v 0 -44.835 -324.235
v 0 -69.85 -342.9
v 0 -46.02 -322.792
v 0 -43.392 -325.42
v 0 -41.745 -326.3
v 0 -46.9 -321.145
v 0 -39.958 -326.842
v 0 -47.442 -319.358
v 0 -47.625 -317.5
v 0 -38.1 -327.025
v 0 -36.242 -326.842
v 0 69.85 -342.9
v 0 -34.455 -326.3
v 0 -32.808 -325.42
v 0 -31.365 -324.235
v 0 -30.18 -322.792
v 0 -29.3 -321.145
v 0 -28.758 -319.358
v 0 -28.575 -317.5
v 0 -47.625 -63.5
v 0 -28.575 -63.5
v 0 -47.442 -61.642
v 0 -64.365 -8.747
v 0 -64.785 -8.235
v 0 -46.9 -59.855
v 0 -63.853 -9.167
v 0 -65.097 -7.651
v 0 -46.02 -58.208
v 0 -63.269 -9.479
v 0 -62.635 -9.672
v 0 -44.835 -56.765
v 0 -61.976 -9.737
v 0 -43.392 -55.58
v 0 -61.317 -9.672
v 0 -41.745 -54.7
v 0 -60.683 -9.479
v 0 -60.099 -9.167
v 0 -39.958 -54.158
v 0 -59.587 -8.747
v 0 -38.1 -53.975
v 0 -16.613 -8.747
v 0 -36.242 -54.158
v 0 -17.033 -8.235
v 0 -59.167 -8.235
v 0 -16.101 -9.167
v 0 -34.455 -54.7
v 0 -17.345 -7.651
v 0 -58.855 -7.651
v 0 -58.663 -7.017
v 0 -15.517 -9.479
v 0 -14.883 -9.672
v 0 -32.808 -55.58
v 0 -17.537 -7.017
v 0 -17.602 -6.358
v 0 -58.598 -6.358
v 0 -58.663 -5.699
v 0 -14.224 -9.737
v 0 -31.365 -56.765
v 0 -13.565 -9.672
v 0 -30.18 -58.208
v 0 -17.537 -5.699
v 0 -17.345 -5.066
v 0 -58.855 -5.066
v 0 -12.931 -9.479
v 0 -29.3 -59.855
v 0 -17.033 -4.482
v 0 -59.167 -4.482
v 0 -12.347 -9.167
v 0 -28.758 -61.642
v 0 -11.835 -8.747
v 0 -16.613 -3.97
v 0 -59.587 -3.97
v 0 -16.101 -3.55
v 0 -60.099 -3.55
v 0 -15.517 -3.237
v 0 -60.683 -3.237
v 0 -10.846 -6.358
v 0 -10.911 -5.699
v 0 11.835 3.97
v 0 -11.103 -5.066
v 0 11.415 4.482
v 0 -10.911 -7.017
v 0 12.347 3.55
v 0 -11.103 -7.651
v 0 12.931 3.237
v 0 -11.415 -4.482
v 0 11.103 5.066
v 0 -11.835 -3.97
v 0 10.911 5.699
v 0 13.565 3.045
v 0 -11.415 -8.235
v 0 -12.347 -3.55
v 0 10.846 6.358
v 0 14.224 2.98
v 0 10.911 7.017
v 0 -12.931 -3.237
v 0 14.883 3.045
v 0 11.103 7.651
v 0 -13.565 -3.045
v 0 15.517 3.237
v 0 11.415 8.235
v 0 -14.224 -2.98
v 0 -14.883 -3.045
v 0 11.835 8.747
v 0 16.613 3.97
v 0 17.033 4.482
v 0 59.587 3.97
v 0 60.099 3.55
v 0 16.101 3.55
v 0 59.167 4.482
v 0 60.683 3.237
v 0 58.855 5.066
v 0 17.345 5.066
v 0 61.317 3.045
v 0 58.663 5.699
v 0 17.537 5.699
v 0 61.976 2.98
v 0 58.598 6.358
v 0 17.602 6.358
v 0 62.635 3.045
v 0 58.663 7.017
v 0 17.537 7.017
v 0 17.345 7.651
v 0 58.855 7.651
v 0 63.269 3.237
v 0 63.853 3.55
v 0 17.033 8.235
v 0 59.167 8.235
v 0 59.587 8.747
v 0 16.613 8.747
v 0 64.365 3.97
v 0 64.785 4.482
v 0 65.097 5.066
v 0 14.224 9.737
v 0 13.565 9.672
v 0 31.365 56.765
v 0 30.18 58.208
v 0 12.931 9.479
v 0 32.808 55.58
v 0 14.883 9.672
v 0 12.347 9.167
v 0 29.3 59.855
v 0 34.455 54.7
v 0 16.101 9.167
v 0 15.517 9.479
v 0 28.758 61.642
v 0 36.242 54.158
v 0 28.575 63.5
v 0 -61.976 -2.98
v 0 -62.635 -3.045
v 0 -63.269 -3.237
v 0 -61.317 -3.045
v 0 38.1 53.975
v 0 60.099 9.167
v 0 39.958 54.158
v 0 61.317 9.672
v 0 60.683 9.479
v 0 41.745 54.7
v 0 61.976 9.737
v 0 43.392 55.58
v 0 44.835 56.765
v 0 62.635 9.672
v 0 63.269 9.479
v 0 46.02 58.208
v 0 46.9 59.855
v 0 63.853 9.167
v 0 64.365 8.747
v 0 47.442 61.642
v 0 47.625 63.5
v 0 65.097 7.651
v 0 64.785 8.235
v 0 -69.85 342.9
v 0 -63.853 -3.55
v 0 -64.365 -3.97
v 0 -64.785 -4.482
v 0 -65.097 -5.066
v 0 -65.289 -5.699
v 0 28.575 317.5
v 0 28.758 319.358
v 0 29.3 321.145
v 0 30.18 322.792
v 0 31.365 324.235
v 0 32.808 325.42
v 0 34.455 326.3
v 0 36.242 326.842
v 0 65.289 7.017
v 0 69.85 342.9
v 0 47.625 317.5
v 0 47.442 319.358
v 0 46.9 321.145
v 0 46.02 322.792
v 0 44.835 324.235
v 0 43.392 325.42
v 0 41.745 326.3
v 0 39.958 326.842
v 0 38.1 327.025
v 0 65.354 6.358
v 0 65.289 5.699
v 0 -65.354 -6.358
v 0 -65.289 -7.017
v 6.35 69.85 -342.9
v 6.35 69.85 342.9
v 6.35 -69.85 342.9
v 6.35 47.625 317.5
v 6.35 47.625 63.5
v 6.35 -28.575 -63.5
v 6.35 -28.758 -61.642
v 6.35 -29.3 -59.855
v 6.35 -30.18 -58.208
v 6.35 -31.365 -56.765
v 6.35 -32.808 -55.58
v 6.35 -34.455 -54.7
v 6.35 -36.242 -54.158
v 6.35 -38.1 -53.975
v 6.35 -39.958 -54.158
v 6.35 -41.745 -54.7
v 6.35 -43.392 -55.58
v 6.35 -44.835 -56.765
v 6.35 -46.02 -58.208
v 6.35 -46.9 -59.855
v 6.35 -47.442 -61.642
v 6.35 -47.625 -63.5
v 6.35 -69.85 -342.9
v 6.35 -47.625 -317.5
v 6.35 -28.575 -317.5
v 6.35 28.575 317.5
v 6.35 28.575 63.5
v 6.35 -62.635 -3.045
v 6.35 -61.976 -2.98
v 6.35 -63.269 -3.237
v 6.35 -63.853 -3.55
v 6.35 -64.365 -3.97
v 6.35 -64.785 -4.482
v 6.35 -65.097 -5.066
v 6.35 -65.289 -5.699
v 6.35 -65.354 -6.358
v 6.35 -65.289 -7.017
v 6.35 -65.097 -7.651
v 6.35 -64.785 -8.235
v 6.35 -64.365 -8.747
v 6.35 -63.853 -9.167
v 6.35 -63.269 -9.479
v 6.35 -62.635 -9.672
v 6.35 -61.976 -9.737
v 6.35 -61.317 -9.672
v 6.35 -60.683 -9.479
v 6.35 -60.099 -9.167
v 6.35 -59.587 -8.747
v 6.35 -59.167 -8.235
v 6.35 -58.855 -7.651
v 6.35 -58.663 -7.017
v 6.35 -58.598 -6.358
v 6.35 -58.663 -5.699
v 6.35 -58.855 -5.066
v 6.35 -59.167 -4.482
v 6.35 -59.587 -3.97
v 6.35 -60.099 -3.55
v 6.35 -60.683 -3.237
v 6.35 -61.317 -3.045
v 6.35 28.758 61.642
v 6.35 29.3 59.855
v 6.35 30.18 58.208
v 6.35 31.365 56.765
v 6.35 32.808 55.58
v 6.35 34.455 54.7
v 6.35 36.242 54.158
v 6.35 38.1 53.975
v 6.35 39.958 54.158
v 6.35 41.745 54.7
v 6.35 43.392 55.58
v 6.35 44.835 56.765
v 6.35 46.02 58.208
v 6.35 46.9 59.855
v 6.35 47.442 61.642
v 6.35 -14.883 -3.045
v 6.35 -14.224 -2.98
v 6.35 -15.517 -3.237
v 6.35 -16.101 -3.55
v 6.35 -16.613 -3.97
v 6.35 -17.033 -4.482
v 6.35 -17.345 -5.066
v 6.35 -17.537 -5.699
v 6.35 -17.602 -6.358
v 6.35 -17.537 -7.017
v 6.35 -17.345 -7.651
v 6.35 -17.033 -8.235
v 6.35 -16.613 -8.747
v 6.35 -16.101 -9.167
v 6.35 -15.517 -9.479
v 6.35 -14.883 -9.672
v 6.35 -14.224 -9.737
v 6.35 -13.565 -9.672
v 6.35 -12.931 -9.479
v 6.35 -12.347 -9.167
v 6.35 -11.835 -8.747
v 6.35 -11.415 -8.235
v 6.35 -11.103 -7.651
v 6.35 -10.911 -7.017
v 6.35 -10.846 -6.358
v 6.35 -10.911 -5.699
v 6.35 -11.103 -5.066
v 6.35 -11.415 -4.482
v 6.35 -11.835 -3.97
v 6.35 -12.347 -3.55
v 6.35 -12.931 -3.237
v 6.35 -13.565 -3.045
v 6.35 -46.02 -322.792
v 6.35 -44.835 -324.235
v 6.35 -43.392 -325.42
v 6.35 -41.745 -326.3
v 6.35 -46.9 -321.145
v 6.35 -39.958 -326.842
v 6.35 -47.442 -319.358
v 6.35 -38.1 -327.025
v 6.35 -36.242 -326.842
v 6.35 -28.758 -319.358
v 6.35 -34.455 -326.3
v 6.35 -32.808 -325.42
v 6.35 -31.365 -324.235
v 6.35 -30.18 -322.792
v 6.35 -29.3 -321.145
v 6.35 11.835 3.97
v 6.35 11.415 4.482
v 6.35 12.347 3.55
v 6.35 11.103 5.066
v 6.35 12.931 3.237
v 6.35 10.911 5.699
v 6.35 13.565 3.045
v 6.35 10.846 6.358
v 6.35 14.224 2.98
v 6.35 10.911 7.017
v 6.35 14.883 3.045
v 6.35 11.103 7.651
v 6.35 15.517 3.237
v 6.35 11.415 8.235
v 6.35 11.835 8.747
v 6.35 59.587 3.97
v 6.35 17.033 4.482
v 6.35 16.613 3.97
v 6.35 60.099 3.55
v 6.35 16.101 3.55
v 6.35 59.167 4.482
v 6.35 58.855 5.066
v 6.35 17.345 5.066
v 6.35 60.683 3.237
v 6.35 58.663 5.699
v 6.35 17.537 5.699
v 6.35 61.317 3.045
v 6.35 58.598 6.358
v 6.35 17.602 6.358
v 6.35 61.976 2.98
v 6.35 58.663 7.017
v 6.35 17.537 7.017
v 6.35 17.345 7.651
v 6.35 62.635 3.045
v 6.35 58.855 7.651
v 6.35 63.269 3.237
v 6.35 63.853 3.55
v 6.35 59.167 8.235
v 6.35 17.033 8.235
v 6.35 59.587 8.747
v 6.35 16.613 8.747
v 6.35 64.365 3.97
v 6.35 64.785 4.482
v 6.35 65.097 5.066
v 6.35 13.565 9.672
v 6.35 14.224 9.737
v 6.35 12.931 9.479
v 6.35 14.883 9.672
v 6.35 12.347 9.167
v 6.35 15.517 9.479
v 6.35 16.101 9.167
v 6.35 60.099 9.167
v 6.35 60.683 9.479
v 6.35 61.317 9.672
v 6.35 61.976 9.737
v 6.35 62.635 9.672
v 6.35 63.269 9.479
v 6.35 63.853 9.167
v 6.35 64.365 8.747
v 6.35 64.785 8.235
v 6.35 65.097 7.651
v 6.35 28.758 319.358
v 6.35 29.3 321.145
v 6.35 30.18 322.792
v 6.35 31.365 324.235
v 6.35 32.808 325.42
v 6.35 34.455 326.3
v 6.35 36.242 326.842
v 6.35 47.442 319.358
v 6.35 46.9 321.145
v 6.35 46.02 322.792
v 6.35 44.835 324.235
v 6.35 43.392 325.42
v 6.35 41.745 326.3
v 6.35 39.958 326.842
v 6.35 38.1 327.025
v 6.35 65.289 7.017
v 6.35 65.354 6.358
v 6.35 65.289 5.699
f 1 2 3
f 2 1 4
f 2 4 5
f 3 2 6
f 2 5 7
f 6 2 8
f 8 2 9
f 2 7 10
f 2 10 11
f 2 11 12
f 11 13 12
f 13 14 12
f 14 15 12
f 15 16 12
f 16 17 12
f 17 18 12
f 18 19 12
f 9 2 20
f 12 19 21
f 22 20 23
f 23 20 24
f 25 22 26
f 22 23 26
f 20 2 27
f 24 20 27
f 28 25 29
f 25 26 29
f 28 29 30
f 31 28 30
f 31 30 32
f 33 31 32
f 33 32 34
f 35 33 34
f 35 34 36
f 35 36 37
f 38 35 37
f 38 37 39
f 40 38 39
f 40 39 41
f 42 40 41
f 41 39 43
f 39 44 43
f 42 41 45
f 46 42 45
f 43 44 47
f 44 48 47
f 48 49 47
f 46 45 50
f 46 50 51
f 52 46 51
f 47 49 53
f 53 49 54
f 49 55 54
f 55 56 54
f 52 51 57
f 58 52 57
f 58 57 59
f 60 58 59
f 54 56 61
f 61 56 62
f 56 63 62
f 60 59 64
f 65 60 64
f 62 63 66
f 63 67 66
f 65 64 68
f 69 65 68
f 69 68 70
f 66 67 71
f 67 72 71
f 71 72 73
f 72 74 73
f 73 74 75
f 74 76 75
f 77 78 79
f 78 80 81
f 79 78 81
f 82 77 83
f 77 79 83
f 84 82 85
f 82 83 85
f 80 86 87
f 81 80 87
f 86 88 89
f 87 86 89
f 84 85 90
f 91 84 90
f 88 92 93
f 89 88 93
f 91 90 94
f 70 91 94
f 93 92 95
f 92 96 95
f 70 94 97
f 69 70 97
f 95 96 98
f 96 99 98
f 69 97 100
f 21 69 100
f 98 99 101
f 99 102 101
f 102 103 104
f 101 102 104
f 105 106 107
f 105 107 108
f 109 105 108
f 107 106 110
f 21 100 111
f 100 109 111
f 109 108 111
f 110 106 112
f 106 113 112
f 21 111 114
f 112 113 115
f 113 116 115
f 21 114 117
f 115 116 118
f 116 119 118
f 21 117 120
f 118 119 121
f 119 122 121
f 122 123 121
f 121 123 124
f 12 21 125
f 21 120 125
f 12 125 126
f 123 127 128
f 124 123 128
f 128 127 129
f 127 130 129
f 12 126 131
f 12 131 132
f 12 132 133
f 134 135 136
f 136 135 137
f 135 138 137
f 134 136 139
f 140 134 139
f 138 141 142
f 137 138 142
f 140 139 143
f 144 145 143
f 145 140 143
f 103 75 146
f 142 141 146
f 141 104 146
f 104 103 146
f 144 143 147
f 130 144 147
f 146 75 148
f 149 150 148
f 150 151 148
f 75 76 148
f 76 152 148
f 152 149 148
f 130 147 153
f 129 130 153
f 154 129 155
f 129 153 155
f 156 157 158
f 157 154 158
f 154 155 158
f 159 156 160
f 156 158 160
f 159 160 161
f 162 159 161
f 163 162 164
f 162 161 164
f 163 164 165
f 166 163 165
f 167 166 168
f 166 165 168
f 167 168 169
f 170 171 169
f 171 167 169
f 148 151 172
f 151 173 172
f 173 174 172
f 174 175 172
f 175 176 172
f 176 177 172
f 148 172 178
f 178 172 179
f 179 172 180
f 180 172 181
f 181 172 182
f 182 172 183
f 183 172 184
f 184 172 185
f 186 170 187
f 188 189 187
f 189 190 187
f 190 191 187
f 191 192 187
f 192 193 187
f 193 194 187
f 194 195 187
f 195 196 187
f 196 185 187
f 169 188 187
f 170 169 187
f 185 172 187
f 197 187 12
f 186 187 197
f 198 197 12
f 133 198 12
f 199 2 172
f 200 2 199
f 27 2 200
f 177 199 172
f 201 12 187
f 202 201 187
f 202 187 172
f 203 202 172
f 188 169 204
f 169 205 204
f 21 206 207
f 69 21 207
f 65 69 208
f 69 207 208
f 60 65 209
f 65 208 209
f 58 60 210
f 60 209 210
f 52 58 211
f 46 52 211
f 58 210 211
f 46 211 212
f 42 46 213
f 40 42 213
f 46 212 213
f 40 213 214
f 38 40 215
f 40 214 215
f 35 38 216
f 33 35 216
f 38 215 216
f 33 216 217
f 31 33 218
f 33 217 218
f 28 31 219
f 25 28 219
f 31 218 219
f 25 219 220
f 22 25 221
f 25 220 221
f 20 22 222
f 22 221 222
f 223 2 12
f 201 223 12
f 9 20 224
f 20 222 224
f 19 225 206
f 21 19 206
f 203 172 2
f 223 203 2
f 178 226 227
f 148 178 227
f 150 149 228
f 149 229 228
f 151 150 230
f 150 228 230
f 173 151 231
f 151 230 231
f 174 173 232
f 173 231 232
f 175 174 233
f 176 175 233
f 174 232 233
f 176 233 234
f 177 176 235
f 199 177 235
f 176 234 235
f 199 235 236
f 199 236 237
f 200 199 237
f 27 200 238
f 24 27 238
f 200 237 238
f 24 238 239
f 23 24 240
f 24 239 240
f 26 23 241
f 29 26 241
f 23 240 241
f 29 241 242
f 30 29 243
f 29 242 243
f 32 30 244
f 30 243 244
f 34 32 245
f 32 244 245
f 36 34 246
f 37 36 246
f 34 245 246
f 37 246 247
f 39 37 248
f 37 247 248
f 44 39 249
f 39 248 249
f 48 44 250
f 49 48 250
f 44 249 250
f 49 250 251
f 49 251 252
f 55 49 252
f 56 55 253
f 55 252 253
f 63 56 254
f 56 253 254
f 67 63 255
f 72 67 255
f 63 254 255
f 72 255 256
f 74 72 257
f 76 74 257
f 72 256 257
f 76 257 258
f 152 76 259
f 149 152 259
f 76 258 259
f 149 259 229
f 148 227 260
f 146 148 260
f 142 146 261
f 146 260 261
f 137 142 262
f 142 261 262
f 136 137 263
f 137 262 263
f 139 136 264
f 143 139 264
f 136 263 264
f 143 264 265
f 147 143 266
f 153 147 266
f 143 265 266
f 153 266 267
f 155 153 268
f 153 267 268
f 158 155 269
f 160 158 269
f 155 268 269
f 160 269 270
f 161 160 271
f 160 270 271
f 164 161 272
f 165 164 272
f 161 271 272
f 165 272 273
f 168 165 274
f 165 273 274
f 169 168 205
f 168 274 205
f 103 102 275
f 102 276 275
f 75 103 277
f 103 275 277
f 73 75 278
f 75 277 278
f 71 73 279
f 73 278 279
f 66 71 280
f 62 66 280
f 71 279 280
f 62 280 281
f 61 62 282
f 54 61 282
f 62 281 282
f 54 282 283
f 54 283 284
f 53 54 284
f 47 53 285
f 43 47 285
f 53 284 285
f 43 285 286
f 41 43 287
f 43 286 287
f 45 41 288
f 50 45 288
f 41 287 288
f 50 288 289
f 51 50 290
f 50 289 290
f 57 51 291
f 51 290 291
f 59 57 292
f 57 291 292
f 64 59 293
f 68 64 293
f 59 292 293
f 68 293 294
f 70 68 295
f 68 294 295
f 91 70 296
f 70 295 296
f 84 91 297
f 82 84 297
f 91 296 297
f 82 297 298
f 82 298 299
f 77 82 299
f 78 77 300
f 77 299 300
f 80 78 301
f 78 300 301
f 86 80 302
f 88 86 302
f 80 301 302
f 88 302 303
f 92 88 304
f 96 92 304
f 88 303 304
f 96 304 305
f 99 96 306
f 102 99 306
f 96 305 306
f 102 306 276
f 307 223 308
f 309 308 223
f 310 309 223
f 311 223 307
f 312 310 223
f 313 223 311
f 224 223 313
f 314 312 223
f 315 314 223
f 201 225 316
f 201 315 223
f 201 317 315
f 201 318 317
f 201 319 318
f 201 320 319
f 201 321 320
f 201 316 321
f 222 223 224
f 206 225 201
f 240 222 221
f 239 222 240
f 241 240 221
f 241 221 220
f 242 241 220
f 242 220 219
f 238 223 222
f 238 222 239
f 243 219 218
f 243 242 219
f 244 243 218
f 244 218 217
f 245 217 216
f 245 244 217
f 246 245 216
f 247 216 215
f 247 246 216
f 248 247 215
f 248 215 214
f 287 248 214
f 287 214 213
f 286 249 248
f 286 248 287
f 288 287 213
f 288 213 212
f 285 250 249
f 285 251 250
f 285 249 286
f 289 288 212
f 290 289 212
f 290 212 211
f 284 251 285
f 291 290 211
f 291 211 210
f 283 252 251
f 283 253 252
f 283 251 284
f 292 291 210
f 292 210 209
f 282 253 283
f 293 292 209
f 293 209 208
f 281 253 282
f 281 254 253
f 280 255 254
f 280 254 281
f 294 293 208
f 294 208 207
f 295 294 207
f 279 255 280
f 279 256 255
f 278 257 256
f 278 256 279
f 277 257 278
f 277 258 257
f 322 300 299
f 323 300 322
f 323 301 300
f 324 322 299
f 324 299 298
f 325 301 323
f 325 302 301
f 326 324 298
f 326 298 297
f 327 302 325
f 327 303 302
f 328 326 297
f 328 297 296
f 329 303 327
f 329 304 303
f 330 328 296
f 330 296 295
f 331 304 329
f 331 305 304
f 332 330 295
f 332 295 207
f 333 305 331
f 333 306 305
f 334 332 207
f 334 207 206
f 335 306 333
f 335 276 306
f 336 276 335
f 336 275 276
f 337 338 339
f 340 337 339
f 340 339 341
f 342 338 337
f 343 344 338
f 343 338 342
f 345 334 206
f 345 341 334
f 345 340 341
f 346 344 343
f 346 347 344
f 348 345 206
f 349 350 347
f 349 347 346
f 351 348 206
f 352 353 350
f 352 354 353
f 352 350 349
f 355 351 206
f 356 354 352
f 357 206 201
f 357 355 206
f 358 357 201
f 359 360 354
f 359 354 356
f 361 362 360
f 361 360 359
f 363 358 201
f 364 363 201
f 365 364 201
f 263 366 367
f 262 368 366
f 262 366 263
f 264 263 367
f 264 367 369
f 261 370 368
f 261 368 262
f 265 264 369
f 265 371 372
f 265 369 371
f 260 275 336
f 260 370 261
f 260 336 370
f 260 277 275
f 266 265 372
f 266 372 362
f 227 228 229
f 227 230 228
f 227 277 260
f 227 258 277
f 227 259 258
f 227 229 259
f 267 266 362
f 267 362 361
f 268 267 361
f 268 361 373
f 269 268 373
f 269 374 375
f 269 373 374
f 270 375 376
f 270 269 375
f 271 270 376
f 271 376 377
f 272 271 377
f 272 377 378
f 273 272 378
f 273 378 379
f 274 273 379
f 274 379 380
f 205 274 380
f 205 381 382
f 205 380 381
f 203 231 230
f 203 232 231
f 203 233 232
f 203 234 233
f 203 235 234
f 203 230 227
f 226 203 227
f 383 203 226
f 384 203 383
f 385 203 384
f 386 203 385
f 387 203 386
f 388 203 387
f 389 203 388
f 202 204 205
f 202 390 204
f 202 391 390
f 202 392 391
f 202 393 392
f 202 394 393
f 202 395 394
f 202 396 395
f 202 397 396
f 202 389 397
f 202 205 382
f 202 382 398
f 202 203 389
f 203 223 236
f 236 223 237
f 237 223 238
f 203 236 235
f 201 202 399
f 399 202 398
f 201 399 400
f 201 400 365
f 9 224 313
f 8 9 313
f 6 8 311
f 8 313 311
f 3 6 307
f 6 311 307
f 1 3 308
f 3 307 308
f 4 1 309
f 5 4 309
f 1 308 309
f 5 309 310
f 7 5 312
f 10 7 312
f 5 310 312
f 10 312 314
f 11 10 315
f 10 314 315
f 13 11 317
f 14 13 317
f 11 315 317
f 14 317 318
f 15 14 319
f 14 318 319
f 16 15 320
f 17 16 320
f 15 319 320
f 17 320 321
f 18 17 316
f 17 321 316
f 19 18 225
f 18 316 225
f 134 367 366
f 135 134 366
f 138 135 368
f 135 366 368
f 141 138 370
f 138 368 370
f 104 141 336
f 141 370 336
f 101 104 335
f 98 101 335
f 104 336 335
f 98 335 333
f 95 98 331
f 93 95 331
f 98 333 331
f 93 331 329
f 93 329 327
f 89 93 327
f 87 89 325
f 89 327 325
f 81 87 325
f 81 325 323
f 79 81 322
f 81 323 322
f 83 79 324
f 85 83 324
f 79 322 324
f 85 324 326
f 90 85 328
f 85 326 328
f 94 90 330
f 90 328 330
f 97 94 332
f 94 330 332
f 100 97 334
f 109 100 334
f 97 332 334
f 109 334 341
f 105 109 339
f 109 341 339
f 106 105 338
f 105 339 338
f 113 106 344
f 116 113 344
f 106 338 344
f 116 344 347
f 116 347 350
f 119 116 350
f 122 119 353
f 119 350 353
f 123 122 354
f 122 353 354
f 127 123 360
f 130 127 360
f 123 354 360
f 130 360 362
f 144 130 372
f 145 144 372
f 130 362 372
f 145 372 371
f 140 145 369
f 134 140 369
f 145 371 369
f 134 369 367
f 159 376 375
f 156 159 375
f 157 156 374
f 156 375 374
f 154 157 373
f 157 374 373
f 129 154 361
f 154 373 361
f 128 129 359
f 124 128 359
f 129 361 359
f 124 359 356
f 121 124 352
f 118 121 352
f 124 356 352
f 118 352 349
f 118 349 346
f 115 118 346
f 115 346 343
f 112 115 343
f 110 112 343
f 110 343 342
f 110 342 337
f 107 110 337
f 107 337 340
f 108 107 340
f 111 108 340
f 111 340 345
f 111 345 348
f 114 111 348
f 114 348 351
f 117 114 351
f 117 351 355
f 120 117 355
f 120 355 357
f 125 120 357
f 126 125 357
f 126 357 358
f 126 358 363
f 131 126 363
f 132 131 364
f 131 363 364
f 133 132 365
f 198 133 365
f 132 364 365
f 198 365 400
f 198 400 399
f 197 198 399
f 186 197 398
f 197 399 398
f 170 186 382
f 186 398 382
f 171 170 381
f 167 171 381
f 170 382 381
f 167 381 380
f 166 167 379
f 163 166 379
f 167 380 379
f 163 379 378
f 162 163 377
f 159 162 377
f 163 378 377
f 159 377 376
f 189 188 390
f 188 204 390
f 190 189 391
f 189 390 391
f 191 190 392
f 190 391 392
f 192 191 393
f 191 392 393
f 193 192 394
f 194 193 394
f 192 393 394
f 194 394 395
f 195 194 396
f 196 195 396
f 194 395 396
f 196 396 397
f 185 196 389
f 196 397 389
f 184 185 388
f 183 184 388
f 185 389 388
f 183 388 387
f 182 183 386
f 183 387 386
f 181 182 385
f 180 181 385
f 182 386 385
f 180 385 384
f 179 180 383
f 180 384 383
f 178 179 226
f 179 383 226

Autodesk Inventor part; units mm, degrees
ref_plane "YZ Plane" through (0, 0, 0) normal (1, 0, 0) x (0, 1, 0)
ref_plane "XZ Plane" through (0, 0, 0) normal (0, 1, 0) x (-1, 0, 0)
ref_plane "XY Plane" through (0, 0, 0) normal (0, 0, 1) x (1, 0, 0)
sketch "Sketch1" plane through (0, 0, 0) normal (1, 0, 0) x (0, 1, 0)
  line L0 (-69.85, 342.9) -> (-69.85, -342.9)
  line L1 (-69.85, -342.9) -> (69.85, -342.9)
  line L2 (69.85, -342.9) -> (69.85, 342.9)
  line L3 (69.85, 342.9) -> (-69.85, 342.9)
  line L4 (-69.85, 342.9) -> (69.85, -342.9) construction
  line L5 (-69.85, -342.9) -> (69.85, 342.9) construction
  point P0 (0, 0)
  dimension "width" = 685.8
  dimension "height" = 139.7
extrude "Extrusion1" add sketch "Sketch1" along normal blind 6.35
sketch "Sketch2" plane through (6.35, 0, 0) normal (1, 0, 0) x (0, 0, -1)
  line L0 (-317.5, 38.1) -> (-63.5, 38.1) construction
  line L1 (-317.5, 28.575) -> (-63.5, 28.575)
  line L2 (-63.5, 47.625) -> (-317.5, 47.625)
  arc A0 (-317.5, 47.625) -> (-317.5, 28.575) centre (-317.5, 38.1) ccw
  arc A1 (-63.5, 28.575) -> (-63.5, 47.625) centre (-63.5, 38.1) ccw
  line L3 (342.9, 69.85) -> (-342.9, 69.85) projected
  line L4 (-342.9, 69.85) -> (-342.9, -69.85) projected
  line L5 (63.5, -38.1) -> (317.5, -38.1) construction
  line L6 (63.5, -47.625) -> (317.5, -47.625)
  line L7 (317.5, -28.575) -> (63.5, -28.575)
  arc A2 (63.5, -28.575) -> (63.5, -47.625) centre (63.5, -38.1) ccw
  arc A3 (317.5, -47.625) -> (317.5, -28.575) centre (317.5, -38.1) ccw
  line L8 (-342.9, -69.85) -> (342.9, -69.85) projected
  line L9 (342.9, -69.85) -> (342.9, 69.85) projected
  point P0 (0, 0)
  point P1 (-190.5, 38.1)
  point P2 (190.5, -38.1)
  dimension "slot_center_from_top" = 31.75
  dimension "slot_center_from_side" = 152.4
  dimension "slot_radius" = 9.525
  dimension "d7" = 31.75
  dimension "d8" = 152.4
  dimension "d9" = 9.525
  dimension "length_of_slot" = 254
  dimension "d13" = 254
extrude "Extrusion2" cut sketch "Sketch2" against normal through all contours A0 L2 A1 L1 | A2 L7 A3 L6
sketch "Sketch3" plane through (0, 0, 0) normal (-1, 0, 0) x (0, 0, 1)
  line L0 (-342.9, 69.85) -> (342.9, 69.85) construction
  line L1 (6.3584, 69.85) -> (6.3584, -72.7678) construction
  line L2 (342.9, 69.85) -> (342.9, -69.85) construction
  line L3 (-6.3584, 69.85) -> (-6.3584, -69.85) construction
  line L4 (-342.9, -69.85) -> (-342.9, 69.85) construction
  line L5 (-6.3584, 61.976) -> (6.3584, 61.976) construction
  line L6 (-6.3584, -61.976) -> (6.3584, -61.976) construction
  line L7 (342.9, -69.85) -> (-342.9, -69.85) construction
  line L8 (-6.3584, 14.224) -> (6.3584, 14.224) construction
  line L9 (-6.3584, -14.224) -> (6.3584, -14.224) construction
  point P0 (0, 0)
  point P1 (80.6051, 237.827)
  point P2 (47.886, -92.9067)
  dimension "Vertical_Line_For_Bolt_Holes" = 336.5416
  dimension "d15" = 336.5416
  dimension "First_Horizontal_Line" = 7.874
  dimension "d17" = 7.874
  dimension "Second_Horizontal_Line" = 47.752
  dimension "d19" = 47.752
hole "Hole1" at (0, 61.976, 6.3584) at (0, -61.976, -6.3584) at (0, 237.827, 80.6051) at (0, -92.9067, 47.886) at (0, 14.224, 6.3584) at (0, -14.224, -6.3584) direction (1, 0, 0) diameter 6.7564 end through all
equation "\"d7\" = slot_center_from_top"
equation "\"d8\" = slot_center_from_side"
equation "\"d9\" = slot_radius"
equation "\"d13\" = length_of_slot"
equation "\"d15\" = Vertical_Line_For_Bolt_Holes"
equation "\"d17\" = First_Horizontal_Line"
equation "\"d19\" = Second_Horizontal_Line"
properties part number "5.5 x 27 x 1/4/ x 3/8" material "Aluminum 6061"
